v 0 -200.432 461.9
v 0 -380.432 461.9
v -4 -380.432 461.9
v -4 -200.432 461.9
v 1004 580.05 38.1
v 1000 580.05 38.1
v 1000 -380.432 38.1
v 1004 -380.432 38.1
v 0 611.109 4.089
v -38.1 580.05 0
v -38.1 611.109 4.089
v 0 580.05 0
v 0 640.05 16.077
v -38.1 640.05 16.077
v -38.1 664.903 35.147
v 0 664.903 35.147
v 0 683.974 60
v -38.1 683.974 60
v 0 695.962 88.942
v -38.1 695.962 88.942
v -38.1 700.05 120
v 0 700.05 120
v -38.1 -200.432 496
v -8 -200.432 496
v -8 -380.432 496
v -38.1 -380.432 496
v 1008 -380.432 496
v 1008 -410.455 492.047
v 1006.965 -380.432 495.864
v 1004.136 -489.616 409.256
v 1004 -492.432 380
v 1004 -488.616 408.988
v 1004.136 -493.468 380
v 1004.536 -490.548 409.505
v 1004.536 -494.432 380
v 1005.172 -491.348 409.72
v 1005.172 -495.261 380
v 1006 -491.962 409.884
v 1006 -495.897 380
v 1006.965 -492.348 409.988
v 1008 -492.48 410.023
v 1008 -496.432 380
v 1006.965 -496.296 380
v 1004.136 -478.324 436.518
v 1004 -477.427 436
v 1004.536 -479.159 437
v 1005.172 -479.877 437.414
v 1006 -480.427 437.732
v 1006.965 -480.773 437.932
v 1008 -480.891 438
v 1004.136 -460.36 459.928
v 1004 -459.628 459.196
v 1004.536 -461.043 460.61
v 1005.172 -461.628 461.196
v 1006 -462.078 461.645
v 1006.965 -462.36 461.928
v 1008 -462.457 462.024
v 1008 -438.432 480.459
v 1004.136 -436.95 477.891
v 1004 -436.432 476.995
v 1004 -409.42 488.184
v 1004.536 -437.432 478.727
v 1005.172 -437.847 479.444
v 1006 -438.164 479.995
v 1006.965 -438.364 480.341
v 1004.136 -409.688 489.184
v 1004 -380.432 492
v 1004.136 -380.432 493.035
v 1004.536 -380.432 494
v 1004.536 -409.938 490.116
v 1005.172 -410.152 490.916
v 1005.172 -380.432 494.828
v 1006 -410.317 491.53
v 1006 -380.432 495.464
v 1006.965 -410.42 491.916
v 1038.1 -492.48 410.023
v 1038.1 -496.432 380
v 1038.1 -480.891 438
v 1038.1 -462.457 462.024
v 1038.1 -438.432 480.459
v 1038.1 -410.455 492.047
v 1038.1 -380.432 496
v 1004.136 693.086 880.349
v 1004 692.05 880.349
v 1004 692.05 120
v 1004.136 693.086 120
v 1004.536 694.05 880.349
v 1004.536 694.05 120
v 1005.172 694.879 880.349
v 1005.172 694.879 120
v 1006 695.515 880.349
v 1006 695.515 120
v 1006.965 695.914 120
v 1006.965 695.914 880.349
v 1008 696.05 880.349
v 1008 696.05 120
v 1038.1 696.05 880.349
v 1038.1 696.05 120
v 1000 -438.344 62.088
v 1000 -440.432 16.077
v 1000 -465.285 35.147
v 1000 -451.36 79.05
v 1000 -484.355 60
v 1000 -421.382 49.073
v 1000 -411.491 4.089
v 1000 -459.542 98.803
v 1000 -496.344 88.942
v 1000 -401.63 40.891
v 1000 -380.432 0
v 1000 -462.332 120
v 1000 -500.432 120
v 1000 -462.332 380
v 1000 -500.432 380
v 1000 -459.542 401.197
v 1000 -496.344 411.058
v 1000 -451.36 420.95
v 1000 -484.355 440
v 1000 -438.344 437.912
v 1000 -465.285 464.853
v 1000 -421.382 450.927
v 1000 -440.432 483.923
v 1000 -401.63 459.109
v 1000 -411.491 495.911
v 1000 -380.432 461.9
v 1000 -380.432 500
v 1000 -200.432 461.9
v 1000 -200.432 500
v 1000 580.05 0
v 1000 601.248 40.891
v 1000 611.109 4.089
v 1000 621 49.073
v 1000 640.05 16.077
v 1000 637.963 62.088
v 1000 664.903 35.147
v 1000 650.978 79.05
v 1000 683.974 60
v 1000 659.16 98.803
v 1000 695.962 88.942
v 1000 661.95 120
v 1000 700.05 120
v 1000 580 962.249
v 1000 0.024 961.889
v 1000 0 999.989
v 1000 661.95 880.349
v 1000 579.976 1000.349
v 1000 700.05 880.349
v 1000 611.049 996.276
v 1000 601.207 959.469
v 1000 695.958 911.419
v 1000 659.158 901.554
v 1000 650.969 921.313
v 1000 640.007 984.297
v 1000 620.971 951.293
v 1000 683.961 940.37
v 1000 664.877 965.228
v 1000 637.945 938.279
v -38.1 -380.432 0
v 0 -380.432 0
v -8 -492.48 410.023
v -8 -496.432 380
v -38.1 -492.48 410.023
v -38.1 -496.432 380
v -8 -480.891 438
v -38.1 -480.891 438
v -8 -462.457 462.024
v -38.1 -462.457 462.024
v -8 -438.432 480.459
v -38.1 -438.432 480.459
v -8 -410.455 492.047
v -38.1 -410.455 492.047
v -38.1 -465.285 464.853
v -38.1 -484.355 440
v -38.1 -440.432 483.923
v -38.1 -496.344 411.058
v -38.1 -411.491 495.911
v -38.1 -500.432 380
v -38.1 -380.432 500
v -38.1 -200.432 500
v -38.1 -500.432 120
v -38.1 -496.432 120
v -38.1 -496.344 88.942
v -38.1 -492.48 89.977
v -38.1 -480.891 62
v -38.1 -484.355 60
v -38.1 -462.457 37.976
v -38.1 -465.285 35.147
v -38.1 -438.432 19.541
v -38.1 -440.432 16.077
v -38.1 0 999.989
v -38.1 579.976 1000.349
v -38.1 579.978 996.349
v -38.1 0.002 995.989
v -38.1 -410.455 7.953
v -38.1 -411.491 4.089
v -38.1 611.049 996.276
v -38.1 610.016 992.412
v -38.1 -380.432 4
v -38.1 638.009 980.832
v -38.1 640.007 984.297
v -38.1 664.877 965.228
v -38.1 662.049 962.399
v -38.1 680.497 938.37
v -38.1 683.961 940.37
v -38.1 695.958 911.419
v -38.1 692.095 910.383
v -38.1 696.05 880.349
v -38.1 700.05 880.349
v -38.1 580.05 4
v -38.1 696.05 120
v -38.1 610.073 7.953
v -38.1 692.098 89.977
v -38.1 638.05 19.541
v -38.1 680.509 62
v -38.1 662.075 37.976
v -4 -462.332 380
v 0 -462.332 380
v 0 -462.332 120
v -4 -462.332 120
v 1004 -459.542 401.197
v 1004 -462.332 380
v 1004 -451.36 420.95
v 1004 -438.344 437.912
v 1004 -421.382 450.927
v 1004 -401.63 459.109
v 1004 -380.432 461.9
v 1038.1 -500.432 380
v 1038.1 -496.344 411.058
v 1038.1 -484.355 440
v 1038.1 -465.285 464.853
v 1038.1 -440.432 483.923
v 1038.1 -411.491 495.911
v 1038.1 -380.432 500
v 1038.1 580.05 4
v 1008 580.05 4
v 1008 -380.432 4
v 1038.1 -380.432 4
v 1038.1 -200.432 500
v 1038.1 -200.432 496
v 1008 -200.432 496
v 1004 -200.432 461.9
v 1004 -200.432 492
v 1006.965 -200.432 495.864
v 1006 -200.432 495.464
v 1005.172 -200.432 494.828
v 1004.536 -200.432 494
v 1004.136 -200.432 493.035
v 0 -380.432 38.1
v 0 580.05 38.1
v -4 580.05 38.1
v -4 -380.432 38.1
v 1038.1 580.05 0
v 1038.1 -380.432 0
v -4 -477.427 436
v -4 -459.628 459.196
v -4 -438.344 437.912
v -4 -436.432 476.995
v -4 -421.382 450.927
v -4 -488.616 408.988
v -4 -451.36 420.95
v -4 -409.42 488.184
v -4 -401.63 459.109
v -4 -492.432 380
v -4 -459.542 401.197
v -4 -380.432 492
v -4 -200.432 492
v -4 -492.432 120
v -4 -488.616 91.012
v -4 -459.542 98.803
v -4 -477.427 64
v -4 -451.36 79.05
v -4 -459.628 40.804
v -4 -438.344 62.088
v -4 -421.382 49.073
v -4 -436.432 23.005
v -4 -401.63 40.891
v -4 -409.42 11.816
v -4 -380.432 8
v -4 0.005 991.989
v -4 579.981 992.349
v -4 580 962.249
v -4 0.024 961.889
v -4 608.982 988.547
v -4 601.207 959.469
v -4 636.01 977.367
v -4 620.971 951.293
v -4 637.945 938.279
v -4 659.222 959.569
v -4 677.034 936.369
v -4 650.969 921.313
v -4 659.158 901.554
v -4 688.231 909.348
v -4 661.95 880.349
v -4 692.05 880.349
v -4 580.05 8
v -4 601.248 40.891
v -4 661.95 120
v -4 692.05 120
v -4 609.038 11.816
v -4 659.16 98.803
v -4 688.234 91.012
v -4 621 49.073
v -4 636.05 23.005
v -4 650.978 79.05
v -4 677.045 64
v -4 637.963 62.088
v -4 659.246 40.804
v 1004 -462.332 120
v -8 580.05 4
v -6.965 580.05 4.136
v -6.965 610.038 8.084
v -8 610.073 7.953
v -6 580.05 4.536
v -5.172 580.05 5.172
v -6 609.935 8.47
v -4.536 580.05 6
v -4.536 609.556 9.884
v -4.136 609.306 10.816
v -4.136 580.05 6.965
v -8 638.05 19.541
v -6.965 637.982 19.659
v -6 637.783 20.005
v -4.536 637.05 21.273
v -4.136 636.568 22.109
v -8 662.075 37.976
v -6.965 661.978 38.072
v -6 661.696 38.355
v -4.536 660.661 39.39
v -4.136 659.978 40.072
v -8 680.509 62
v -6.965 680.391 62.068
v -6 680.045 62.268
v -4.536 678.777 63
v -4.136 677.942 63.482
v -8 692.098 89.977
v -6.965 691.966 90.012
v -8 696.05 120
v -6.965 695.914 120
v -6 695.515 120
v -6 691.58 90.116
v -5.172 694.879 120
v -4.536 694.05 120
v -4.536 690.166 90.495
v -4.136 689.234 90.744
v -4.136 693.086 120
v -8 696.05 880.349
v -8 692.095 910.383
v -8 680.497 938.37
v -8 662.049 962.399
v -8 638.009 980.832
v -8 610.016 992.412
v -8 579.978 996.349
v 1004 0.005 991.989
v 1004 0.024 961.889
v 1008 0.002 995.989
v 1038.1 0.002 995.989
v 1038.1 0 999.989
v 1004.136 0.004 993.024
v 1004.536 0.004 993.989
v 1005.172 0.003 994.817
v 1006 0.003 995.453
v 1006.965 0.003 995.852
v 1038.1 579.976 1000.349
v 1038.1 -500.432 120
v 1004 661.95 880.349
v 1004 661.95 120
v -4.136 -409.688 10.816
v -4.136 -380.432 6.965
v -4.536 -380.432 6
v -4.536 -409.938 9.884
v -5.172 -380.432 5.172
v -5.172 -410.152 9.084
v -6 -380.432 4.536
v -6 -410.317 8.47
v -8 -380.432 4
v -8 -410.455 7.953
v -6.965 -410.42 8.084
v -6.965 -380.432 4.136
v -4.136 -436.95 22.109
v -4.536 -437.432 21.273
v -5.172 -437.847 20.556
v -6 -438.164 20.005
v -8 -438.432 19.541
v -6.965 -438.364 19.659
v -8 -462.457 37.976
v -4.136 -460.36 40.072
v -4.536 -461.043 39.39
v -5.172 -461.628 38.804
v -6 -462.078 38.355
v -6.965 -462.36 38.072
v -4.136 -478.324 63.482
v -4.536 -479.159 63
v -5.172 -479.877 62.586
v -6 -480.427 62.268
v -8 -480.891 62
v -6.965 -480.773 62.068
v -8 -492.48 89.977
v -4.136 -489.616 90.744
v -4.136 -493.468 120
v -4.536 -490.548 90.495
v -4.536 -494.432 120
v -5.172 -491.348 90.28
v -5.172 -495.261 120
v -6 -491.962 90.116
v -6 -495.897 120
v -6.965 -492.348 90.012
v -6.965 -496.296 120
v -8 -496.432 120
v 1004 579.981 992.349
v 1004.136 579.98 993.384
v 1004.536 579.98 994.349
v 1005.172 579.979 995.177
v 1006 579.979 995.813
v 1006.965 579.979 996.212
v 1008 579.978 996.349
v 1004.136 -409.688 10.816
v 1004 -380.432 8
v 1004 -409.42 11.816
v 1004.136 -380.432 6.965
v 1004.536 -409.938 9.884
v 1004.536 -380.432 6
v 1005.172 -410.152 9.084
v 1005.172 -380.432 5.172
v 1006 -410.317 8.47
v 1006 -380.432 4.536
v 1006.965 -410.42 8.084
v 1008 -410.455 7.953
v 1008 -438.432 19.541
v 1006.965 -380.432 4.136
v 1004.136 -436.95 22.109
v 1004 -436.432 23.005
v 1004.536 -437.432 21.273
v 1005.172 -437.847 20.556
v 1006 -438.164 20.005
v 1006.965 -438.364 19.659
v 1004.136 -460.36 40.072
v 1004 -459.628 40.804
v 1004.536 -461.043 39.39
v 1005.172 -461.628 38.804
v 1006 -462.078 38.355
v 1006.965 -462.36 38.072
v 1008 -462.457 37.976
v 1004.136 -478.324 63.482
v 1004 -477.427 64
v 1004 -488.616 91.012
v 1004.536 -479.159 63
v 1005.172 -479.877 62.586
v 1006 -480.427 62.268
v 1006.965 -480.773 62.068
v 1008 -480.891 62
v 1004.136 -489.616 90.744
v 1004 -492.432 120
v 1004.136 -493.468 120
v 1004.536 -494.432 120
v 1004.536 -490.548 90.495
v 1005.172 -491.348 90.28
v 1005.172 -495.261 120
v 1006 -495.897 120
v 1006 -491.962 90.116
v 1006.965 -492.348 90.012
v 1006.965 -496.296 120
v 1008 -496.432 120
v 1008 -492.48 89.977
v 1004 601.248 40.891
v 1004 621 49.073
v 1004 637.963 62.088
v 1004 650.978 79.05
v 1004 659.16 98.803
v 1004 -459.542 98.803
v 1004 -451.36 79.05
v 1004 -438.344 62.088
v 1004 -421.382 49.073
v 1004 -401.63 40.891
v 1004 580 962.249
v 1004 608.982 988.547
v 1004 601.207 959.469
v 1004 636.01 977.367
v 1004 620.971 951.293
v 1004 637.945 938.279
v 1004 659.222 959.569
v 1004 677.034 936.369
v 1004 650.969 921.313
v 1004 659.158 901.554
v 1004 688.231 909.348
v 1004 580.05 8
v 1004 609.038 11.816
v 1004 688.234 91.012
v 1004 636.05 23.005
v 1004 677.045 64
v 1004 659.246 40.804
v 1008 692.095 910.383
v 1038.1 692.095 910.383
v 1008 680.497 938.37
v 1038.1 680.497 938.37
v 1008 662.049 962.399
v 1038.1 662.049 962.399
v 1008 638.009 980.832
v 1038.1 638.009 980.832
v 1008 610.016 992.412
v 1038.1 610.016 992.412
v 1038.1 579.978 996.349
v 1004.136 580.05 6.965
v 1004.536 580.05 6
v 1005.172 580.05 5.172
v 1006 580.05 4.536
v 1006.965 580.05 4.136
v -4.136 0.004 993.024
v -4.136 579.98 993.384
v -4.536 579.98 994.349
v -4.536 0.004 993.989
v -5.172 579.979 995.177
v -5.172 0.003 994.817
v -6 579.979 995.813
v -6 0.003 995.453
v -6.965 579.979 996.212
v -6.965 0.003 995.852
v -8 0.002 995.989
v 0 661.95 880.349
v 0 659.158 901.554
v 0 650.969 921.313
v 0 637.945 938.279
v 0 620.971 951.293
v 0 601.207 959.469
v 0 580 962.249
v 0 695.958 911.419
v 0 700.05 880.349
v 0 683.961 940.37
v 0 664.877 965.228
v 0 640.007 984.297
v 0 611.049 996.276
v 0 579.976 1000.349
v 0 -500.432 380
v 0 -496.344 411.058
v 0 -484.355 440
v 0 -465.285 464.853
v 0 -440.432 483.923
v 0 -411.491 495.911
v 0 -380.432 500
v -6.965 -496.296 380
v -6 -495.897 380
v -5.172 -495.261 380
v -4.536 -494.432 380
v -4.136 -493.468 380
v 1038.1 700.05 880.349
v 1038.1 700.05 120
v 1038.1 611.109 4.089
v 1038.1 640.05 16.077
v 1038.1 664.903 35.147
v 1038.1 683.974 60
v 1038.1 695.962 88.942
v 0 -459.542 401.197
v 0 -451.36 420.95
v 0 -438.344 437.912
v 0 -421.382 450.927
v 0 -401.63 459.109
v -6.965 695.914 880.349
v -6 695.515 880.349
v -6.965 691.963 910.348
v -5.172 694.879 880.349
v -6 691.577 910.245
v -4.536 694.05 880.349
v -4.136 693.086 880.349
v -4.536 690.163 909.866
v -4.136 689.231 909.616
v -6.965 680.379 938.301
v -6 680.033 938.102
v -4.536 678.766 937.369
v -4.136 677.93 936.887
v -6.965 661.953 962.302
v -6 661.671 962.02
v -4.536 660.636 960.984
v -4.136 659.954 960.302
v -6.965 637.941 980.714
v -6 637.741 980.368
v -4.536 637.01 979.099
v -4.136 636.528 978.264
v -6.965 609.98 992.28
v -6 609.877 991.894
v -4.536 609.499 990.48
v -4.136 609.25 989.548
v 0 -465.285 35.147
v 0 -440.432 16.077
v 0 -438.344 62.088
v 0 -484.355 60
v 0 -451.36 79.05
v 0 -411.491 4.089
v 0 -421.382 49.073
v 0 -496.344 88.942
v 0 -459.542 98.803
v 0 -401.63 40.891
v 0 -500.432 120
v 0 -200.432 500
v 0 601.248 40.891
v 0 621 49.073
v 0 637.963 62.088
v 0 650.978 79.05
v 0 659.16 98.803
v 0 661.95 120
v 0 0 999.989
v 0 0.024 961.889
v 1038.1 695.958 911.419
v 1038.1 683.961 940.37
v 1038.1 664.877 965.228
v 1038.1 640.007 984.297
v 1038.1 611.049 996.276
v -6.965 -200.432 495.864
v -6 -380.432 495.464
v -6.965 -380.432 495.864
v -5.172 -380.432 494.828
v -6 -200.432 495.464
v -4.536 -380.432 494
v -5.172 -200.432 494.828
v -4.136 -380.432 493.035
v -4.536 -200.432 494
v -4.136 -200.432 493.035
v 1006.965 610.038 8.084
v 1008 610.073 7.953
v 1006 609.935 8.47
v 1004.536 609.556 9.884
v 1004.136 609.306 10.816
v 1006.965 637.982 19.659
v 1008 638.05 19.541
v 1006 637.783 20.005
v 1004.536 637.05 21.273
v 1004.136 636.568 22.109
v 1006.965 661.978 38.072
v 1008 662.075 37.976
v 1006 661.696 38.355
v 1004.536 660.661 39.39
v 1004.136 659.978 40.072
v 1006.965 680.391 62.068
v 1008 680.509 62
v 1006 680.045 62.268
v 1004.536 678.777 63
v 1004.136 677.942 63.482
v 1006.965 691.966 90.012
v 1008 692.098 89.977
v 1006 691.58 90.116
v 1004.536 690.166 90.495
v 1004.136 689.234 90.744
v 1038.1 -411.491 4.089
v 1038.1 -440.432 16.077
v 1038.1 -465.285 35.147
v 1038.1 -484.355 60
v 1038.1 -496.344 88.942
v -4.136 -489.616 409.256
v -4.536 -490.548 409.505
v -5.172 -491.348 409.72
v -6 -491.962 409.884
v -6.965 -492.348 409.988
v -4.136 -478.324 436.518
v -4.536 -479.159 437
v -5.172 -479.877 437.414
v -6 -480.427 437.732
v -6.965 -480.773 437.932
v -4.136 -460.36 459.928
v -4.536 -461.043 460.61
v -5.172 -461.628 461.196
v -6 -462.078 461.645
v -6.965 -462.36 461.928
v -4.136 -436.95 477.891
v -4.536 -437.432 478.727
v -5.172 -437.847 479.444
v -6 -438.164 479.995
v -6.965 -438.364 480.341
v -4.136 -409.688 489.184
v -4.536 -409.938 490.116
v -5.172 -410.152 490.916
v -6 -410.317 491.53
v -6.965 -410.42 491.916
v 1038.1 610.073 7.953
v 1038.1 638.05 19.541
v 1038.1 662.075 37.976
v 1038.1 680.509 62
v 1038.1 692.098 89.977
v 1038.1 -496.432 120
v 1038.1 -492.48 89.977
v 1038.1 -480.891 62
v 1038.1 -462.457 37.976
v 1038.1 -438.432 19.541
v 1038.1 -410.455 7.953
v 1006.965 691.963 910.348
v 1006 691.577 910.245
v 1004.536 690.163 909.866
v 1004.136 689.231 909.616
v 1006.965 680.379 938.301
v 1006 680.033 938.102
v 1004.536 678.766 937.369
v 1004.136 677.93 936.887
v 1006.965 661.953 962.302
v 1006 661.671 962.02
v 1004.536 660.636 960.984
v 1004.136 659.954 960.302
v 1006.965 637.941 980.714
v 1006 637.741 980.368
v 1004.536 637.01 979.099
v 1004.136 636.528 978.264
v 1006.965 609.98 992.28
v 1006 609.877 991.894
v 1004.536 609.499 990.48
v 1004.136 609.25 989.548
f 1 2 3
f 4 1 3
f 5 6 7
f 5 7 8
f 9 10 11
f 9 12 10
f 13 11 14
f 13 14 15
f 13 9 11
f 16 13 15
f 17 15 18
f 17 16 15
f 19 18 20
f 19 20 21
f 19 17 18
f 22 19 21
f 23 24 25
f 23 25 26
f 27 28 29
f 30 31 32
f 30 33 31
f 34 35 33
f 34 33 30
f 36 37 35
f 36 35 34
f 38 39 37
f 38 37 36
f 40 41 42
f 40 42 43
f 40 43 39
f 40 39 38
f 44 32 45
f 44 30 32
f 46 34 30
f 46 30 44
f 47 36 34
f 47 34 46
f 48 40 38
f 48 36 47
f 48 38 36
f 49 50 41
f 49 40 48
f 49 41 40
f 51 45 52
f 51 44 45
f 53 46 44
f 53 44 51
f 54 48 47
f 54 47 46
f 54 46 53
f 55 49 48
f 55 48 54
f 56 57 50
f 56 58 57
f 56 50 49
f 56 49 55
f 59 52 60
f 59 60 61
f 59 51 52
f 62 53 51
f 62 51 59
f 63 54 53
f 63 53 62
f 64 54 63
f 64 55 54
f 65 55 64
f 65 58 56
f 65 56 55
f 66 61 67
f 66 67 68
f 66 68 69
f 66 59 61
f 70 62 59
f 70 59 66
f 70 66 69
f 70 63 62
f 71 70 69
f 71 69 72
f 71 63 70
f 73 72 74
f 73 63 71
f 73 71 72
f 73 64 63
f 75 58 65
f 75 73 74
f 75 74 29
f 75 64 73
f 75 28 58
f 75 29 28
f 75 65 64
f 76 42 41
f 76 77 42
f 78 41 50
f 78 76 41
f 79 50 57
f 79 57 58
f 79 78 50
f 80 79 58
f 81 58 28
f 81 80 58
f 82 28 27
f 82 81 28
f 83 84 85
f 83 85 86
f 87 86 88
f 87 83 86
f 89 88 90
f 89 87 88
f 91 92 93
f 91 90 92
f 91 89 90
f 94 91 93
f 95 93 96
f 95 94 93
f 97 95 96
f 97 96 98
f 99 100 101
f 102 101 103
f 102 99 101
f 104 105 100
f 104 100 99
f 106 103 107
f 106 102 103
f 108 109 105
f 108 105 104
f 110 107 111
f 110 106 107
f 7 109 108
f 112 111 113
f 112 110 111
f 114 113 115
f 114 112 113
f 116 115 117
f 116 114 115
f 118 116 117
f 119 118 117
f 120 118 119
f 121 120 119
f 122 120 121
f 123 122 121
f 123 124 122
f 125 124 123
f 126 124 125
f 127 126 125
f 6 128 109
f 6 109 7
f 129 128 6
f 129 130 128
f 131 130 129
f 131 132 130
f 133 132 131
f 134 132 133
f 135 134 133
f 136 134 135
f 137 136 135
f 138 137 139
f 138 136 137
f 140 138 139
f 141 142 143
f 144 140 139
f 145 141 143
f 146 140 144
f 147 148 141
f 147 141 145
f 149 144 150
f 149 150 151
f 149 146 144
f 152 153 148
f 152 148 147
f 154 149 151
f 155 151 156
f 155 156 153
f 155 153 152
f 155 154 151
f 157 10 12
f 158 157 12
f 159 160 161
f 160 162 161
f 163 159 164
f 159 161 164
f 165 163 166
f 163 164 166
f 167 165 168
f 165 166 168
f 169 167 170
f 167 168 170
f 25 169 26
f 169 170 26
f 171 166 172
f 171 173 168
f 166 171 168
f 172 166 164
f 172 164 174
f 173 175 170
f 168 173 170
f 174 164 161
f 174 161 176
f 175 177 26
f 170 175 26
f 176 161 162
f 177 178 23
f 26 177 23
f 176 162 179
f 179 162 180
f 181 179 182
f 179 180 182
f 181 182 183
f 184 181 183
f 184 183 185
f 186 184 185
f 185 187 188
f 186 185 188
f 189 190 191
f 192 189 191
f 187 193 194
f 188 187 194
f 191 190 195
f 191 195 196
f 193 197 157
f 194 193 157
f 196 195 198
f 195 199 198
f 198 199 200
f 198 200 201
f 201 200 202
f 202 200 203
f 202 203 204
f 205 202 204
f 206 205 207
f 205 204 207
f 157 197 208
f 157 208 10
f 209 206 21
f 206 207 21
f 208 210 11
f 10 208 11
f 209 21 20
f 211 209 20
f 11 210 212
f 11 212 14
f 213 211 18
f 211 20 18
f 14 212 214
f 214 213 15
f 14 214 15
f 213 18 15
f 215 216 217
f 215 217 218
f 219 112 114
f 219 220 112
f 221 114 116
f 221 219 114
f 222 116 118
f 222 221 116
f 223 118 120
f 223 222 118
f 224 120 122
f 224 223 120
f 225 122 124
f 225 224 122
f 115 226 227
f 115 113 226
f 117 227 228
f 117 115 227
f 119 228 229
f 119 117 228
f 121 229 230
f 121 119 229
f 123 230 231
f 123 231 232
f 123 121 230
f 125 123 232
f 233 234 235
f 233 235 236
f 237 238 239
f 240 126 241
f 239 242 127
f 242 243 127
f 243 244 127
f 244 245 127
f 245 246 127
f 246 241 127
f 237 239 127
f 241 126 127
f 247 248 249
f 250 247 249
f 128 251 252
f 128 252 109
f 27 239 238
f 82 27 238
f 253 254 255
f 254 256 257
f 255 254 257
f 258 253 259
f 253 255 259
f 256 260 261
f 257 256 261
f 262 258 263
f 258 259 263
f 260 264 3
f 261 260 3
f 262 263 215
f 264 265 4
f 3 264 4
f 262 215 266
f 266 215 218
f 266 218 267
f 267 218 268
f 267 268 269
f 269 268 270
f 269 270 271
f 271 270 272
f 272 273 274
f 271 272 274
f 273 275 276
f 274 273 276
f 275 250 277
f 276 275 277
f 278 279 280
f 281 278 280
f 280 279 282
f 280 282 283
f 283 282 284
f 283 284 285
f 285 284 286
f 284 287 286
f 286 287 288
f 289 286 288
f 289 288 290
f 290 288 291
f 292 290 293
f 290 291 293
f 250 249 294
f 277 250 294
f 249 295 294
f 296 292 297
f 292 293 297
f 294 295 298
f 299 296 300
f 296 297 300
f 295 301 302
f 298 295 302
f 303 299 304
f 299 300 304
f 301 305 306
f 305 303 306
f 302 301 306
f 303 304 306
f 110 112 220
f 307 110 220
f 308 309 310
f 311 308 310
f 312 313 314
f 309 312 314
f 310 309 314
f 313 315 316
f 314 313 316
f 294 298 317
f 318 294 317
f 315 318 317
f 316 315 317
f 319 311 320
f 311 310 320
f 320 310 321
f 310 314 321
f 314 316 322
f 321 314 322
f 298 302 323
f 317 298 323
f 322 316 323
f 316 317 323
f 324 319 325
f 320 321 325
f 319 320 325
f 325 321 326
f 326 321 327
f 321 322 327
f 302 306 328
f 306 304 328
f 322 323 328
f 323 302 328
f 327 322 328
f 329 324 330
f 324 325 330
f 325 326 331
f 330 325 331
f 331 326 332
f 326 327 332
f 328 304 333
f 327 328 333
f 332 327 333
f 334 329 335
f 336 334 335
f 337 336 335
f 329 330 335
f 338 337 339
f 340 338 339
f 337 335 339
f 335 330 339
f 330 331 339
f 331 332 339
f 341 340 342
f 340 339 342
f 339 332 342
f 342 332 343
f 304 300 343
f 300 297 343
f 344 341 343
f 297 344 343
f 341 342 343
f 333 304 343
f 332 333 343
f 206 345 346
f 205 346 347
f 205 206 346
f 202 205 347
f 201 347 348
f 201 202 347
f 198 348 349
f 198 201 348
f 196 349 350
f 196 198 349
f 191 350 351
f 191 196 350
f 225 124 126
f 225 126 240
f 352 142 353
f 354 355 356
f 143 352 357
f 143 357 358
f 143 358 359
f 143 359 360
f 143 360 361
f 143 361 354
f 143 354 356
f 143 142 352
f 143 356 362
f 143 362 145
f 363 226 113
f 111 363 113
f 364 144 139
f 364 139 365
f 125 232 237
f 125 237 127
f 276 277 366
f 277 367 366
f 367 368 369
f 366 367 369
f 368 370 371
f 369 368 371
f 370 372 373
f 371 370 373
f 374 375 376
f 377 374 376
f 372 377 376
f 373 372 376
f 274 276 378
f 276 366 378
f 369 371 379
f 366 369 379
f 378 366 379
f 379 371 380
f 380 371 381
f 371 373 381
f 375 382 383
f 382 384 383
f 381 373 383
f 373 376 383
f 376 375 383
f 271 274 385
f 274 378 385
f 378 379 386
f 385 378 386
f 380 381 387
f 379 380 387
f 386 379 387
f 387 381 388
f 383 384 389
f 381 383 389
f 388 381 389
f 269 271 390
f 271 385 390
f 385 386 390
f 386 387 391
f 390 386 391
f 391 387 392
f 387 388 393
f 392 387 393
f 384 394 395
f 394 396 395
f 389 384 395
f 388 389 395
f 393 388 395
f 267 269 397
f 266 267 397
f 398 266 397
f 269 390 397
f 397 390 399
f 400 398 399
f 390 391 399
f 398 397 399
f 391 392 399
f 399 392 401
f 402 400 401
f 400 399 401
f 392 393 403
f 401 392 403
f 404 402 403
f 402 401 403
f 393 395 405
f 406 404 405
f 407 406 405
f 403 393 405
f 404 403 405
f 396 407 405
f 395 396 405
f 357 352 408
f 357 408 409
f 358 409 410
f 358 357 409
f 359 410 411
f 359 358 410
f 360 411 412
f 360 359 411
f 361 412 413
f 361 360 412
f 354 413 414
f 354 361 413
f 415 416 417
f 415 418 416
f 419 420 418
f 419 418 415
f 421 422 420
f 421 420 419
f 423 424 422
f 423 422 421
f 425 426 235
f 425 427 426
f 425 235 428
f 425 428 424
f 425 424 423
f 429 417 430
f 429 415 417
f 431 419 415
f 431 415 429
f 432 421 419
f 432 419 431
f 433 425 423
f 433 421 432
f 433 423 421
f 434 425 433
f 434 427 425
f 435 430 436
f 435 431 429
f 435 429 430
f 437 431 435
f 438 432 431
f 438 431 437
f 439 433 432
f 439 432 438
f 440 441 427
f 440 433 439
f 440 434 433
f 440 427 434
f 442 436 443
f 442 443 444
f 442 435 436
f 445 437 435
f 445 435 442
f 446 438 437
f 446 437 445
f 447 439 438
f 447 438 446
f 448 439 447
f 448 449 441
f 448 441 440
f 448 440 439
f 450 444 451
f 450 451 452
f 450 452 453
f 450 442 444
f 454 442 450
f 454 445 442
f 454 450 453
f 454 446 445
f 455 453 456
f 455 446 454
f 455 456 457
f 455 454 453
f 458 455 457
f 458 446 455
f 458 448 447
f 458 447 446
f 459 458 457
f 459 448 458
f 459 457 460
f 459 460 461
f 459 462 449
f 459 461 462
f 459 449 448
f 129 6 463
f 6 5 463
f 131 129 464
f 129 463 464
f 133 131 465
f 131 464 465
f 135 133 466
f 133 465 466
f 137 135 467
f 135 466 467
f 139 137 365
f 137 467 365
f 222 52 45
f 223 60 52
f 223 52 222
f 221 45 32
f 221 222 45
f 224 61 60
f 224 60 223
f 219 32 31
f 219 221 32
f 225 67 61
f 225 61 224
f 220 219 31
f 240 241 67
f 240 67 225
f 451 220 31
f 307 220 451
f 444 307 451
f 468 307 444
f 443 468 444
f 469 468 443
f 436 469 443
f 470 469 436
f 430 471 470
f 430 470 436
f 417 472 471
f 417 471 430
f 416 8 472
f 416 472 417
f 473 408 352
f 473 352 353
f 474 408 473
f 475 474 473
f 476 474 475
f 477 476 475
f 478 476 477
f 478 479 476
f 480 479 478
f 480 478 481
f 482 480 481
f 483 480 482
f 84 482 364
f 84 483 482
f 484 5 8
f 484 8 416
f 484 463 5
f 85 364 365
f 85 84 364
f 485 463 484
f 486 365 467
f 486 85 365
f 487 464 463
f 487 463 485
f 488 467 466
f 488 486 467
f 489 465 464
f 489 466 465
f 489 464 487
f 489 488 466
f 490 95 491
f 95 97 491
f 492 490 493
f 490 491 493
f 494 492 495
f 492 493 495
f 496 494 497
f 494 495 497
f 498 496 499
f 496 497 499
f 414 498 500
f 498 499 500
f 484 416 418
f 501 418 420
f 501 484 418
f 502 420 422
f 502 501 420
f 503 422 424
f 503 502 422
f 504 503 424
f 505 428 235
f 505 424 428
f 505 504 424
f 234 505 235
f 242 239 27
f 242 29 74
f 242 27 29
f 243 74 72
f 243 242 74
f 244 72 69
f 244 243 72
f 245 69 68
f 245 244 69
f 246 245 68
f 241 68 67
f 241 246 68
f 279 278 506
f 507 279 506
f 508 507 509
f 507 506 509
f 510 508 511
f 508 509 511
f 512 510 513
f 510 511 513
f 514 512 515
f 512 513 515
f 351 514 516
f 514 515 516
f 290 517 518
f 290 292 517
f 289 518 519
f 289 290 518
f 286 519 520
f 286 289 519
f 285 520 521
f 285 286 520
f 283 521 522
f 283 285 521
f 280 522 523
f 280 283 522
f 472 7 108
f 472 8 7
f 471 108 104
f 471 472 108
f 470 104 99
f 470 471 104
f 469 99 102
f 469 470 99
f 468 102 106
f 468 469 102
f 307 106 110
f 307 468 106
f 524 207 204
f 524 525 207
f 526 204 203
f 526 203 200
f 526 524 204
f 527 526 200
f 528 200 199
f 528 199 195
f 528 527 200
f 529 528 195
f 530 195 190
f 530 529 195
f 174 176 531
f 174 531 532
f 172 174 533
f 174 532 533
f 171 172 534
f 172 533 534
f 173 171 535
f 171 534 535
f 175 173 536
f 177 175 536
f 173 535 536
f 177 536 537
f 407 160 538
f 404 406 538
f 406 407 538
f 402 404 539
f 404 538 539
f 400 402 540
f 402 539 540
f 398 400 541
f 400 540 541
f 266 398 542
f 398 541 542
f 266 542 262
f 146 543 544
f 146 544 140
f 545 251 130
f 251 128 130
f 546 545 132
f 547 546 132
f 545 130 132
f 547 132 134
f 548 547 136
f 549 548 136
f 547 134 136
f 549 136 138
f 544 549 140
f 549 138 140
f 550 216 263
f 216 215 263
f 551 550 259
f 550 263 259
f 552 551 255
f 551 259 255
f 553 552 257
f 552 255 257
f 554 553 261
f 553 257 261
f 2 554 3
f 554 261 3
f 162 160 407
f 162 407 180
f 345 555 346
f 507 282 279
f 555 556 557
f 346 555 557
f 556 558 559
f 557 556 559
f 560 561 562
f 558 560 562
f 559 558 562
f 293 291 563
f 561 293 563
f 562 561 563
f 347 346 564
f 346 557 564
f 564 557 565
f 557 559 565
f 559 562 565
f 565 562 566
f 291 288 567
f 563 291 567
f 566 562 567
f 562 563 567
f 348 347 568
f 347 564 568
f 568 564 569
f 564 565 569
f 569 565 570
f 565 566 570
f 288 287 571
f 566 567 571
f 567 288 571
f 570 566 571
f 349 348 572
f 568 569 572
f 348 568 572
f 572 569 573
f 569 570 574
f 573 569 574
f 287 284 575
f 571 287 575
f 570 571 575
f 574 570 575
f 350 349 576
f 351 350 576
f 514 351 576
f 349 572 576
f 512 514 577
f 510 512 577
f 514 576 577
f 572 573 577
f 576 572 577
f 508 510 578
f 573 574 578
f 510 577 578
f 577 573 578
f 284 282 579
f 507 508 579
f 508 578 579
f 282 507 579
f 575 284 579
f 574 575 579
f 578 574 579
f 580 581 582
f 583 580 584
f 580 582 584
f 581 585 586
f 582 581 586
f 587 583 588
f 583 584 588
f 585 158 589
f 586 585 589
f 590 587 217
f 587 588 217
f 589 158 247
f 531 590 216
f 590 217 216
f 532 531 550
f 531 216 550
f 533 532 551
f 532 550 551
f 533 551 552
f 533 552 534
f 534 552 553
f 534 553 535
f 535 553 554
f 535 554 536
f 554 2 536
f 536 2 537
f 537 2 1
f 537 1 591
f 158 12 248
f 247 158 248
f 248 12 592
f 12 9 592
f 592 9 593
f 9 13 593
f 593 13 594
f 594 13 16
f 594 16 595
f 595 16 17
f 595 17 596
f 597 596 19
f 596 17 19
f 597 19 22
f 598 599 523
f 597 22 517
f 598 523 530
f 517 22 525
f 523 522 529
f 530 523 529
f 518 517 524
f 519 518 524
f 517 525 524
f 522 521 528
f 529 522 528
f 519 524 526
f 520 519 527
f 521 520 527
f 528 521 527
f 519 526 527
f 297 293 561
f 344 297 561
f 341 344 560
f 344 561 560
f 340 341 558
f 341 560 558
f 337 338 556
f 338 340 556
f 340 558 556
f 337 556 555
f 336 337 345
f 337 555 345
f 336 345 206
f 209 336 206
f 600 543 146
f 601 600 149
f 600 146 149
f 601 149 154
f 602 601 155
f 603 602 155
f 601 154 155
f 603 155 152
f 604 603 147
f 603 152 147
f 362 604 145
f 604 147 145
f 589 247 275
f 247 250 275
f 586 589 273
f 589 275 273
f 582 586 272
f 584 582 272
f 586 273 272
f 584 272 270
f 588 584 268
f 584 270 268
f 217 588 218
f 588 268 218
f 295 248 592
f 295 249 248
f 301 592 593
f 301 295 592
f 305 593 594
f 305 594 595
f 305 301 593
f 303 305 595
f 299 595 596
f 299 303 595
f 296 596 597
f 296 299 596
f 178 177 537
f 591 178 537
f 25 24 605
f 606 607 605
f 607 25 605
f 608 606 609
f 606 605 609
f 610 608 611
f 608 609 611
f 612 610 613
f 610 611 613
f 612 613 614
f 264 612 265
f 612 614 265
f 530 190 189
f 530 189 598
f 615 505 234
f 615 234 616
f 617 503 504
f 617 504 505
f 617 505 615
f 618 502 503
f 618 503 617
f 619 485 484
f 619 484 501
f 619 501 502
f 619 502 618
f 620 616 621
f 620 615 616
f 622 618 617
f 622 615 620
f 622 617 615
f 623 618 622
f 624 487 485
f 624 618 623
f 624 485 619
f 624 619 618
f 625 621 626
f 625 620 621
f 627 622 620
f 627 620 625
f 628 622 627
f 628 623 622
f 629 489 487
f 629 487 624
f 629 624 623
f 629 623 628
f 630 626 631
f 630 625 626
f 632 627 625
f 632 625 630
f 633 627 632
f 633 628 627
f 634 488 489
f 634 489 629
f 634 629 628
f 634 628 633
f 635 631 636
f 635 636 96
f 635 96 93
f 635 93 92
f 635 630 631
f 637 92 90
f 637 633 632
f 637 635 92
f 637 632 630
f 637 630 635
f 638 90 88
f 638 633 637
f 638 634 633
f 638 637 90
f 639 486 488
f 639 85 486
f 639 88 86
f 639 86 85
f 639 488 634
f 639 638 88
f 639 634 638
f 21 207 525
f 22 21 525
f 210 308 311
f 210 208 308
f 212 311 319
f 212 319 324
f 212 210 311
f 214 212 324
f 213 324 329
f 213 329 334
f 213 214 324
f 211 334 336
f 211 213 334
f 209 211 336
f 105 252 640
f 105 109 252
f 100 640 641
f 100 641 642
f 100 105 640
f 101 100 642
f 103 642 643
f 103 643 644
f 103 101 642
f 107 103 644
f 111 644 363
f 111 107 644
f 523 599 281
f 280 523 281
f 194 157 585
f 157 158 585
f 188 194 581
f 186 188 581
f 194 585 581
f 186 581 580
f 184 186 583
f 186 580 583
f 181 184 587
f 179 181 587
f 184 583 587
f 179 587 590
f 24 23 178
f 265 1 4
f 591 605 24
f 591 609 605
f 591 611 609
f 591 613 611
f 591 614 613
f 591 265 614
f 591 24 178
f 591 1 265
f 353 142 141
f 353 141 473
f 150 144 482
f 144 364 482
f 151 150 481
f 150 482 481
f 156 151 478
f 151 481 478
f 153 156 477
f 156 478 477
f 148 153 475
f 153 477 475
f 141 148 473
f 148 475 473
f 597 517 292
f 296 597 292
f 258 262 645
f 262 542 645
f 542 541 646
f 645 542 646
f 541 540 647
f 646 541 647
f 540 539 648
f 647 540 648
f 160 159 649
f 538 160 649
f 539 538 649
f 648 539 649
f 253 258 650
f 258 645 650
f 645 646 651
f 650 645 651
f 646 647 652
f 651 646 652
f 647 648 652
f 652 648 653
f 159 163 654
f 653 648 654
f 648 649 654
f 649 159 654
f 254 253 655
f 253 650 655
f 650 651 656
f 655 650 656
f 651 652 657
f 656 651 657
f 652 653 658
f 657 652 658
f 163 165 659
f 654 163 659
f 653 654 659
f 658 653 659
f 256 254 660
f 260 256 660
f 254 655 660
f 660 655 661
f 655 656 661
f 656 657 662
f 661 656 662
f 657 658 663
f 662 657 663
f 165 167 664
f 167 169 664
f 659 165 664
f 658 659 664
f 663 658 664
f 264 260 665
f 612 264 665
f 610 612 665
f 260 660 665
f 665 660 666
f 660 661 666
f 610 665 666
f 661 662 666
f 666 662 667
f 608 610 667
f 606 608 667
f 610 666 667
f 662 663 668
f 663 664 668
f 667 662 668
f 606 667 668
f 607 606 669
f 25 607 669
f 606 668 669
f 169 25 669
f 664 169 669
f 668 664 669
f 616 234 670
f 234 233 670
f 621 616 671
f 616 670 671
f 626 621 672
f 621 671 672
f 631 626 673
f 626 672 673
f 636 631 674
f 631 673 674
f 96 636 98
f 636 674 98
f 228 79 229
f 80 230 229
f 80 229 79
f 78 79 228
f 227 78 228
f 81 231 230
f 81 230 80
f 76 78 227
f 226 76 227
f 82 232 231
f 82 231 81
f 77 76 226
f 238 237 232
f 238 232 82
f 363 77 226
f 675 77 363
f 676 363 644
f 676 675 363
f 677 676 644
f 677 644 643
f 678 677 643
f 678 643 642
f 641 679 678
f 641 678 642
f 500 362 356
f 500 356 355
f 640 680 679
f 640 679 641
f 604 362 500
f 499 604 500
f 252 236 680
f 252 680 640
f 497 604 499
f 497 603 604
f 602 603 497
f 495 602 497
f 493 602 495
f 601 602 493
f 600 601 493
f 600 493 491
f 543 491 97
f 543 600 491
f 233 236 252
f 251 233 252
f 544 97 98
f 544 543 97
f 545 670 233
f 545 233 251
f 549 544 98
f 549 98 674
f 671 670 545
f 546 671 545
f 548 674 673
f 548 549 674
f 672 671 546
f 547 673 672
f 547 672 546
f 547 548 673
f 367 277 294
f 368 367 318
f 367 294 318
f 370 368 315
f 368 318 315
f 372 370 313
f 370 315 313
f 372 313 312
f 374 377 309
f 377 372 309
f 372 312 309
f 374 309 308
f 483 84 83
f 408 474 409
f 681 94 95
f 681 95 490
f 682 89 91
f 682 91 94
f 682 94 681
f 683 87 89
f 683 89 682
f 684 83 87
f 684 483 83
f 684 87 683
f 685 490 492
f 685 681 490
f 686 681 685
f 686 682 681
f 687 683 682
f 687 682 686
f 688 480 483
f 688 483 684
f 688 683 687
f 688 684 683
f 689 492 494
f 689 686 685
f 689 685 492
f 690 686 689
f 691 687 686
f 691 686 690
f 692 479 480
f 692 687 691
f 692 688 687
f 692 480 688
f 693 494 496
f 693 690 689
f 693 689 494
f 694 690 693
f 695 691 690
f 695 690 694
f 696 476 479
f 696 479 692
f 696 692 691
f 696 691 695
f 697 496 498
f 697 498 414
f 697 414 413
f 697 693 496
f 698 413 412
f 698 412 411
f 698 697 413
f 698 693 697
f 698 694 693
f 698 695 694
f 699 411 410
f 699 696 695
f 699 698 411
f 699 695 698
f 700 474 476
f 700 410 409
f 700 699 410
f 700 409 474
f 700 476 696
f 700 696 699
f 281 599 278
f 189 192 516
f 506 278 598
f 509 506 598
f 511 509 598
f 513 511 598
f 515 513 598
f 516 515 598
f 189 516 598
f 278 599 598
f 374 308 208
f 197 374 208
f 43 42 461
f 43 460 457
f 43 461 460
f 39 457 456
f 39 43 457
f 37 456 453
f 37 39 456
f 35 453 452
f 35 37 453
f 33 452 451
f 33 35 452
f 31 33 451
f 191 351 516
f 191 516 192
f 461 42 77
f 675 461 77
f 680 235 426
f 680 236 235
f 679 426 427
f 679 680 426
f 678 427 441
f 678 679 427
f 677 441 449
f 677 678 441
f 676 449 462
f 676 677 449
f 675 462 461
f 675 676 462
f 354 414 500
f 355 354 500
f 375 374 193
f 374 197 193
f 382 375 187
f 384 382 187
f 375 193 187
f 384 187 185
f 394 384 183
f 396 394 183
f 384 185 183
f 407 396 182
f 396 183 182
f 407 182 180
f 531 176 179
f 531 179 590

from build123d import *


with BuildPart() as f3:
    # F3: sweep along a path in F1
    with BuildLine(Plane.YZ) as f3_path:
        Line((0, 0), (-380.4324316978, 0))
        ThreePointArc((-380.4324316978, 0), (-465.2852454402, 35.1471862576), (-500.4324316978, 120))
        Line((-500.4324316978, 120), (-500.4324316978, 380))
        ThreePointArc((-500.4324316978, 380), (-465.2852454402, 464.8528137424), (-380.4324316978, 500))
        Line((-380.4324316978, 500), (-200.4324316978, 500))
    # F0 (on Front) → F3 (sweep)
    with BuildSketch(Plane.XZ):
        with BuildLine():
            Line((-38.1, 0), (0, 0))
            Line((0, 0), (0, 38.1))
            Line((0, 38.1), (-4, 38.1))
            Line((-4, 38.1), (-4, 8))
            ThreePointArc((-4, 8), (-5.1715728753, 5.1715728753), (-8, 4))
            Line((-8, 4), (-38.1, 4))
            Line((-38.1, 4), (-38.1, 0))
        make_face()
    sweep(path=f3_path.line)

    # F4: sweep along a path in F2
    with BuildLine(Plane.YZ) as f4_path:
        Line((0, 0), (580.0504732132, 0))
        ThreePointArc((580.0504732132, 0), (664.9032869556, 35.1471862576), (700.0504732132, 120))
        Line((700.0504732132, 120), (700.0504732132, 880.3487852189))
        ThreePointArc((700.0504732132, 880.3487852189), (664.8769417856, 965.2279359541), (579.9759693877, 1000.3487620905))
        Line((579.9759693877, 1000.3487620905), (0, 999.9886751175))
    # F0 (on Front) → F4 (sweep)
    with BuildSketch(Plane.XZ):
        with BuildLine():
            Line((-38.1, 0), (0, 0))
            Line((0, 0), (0, 38.1))
            Line((0, 38.1), (-4, 38.1))
            Line((-4, 38.1), (-4, 8))
            ThreePointArc((-4, 8), (-5.1715728753, 5.1715728753), (-8, 4))
            Line((-8, 4), (-38.1, 4))
            Line((-38.1, 4), (-38.1, 0))
        make_face()
    sweep(path=f4_path.line)


with BuildPart() as f6_1:
    # F6: instance of F3
    add(f3.part.mirror(Plane.YZ.offset(500)))


solid = Compound([f3.part, f6_1.part])
